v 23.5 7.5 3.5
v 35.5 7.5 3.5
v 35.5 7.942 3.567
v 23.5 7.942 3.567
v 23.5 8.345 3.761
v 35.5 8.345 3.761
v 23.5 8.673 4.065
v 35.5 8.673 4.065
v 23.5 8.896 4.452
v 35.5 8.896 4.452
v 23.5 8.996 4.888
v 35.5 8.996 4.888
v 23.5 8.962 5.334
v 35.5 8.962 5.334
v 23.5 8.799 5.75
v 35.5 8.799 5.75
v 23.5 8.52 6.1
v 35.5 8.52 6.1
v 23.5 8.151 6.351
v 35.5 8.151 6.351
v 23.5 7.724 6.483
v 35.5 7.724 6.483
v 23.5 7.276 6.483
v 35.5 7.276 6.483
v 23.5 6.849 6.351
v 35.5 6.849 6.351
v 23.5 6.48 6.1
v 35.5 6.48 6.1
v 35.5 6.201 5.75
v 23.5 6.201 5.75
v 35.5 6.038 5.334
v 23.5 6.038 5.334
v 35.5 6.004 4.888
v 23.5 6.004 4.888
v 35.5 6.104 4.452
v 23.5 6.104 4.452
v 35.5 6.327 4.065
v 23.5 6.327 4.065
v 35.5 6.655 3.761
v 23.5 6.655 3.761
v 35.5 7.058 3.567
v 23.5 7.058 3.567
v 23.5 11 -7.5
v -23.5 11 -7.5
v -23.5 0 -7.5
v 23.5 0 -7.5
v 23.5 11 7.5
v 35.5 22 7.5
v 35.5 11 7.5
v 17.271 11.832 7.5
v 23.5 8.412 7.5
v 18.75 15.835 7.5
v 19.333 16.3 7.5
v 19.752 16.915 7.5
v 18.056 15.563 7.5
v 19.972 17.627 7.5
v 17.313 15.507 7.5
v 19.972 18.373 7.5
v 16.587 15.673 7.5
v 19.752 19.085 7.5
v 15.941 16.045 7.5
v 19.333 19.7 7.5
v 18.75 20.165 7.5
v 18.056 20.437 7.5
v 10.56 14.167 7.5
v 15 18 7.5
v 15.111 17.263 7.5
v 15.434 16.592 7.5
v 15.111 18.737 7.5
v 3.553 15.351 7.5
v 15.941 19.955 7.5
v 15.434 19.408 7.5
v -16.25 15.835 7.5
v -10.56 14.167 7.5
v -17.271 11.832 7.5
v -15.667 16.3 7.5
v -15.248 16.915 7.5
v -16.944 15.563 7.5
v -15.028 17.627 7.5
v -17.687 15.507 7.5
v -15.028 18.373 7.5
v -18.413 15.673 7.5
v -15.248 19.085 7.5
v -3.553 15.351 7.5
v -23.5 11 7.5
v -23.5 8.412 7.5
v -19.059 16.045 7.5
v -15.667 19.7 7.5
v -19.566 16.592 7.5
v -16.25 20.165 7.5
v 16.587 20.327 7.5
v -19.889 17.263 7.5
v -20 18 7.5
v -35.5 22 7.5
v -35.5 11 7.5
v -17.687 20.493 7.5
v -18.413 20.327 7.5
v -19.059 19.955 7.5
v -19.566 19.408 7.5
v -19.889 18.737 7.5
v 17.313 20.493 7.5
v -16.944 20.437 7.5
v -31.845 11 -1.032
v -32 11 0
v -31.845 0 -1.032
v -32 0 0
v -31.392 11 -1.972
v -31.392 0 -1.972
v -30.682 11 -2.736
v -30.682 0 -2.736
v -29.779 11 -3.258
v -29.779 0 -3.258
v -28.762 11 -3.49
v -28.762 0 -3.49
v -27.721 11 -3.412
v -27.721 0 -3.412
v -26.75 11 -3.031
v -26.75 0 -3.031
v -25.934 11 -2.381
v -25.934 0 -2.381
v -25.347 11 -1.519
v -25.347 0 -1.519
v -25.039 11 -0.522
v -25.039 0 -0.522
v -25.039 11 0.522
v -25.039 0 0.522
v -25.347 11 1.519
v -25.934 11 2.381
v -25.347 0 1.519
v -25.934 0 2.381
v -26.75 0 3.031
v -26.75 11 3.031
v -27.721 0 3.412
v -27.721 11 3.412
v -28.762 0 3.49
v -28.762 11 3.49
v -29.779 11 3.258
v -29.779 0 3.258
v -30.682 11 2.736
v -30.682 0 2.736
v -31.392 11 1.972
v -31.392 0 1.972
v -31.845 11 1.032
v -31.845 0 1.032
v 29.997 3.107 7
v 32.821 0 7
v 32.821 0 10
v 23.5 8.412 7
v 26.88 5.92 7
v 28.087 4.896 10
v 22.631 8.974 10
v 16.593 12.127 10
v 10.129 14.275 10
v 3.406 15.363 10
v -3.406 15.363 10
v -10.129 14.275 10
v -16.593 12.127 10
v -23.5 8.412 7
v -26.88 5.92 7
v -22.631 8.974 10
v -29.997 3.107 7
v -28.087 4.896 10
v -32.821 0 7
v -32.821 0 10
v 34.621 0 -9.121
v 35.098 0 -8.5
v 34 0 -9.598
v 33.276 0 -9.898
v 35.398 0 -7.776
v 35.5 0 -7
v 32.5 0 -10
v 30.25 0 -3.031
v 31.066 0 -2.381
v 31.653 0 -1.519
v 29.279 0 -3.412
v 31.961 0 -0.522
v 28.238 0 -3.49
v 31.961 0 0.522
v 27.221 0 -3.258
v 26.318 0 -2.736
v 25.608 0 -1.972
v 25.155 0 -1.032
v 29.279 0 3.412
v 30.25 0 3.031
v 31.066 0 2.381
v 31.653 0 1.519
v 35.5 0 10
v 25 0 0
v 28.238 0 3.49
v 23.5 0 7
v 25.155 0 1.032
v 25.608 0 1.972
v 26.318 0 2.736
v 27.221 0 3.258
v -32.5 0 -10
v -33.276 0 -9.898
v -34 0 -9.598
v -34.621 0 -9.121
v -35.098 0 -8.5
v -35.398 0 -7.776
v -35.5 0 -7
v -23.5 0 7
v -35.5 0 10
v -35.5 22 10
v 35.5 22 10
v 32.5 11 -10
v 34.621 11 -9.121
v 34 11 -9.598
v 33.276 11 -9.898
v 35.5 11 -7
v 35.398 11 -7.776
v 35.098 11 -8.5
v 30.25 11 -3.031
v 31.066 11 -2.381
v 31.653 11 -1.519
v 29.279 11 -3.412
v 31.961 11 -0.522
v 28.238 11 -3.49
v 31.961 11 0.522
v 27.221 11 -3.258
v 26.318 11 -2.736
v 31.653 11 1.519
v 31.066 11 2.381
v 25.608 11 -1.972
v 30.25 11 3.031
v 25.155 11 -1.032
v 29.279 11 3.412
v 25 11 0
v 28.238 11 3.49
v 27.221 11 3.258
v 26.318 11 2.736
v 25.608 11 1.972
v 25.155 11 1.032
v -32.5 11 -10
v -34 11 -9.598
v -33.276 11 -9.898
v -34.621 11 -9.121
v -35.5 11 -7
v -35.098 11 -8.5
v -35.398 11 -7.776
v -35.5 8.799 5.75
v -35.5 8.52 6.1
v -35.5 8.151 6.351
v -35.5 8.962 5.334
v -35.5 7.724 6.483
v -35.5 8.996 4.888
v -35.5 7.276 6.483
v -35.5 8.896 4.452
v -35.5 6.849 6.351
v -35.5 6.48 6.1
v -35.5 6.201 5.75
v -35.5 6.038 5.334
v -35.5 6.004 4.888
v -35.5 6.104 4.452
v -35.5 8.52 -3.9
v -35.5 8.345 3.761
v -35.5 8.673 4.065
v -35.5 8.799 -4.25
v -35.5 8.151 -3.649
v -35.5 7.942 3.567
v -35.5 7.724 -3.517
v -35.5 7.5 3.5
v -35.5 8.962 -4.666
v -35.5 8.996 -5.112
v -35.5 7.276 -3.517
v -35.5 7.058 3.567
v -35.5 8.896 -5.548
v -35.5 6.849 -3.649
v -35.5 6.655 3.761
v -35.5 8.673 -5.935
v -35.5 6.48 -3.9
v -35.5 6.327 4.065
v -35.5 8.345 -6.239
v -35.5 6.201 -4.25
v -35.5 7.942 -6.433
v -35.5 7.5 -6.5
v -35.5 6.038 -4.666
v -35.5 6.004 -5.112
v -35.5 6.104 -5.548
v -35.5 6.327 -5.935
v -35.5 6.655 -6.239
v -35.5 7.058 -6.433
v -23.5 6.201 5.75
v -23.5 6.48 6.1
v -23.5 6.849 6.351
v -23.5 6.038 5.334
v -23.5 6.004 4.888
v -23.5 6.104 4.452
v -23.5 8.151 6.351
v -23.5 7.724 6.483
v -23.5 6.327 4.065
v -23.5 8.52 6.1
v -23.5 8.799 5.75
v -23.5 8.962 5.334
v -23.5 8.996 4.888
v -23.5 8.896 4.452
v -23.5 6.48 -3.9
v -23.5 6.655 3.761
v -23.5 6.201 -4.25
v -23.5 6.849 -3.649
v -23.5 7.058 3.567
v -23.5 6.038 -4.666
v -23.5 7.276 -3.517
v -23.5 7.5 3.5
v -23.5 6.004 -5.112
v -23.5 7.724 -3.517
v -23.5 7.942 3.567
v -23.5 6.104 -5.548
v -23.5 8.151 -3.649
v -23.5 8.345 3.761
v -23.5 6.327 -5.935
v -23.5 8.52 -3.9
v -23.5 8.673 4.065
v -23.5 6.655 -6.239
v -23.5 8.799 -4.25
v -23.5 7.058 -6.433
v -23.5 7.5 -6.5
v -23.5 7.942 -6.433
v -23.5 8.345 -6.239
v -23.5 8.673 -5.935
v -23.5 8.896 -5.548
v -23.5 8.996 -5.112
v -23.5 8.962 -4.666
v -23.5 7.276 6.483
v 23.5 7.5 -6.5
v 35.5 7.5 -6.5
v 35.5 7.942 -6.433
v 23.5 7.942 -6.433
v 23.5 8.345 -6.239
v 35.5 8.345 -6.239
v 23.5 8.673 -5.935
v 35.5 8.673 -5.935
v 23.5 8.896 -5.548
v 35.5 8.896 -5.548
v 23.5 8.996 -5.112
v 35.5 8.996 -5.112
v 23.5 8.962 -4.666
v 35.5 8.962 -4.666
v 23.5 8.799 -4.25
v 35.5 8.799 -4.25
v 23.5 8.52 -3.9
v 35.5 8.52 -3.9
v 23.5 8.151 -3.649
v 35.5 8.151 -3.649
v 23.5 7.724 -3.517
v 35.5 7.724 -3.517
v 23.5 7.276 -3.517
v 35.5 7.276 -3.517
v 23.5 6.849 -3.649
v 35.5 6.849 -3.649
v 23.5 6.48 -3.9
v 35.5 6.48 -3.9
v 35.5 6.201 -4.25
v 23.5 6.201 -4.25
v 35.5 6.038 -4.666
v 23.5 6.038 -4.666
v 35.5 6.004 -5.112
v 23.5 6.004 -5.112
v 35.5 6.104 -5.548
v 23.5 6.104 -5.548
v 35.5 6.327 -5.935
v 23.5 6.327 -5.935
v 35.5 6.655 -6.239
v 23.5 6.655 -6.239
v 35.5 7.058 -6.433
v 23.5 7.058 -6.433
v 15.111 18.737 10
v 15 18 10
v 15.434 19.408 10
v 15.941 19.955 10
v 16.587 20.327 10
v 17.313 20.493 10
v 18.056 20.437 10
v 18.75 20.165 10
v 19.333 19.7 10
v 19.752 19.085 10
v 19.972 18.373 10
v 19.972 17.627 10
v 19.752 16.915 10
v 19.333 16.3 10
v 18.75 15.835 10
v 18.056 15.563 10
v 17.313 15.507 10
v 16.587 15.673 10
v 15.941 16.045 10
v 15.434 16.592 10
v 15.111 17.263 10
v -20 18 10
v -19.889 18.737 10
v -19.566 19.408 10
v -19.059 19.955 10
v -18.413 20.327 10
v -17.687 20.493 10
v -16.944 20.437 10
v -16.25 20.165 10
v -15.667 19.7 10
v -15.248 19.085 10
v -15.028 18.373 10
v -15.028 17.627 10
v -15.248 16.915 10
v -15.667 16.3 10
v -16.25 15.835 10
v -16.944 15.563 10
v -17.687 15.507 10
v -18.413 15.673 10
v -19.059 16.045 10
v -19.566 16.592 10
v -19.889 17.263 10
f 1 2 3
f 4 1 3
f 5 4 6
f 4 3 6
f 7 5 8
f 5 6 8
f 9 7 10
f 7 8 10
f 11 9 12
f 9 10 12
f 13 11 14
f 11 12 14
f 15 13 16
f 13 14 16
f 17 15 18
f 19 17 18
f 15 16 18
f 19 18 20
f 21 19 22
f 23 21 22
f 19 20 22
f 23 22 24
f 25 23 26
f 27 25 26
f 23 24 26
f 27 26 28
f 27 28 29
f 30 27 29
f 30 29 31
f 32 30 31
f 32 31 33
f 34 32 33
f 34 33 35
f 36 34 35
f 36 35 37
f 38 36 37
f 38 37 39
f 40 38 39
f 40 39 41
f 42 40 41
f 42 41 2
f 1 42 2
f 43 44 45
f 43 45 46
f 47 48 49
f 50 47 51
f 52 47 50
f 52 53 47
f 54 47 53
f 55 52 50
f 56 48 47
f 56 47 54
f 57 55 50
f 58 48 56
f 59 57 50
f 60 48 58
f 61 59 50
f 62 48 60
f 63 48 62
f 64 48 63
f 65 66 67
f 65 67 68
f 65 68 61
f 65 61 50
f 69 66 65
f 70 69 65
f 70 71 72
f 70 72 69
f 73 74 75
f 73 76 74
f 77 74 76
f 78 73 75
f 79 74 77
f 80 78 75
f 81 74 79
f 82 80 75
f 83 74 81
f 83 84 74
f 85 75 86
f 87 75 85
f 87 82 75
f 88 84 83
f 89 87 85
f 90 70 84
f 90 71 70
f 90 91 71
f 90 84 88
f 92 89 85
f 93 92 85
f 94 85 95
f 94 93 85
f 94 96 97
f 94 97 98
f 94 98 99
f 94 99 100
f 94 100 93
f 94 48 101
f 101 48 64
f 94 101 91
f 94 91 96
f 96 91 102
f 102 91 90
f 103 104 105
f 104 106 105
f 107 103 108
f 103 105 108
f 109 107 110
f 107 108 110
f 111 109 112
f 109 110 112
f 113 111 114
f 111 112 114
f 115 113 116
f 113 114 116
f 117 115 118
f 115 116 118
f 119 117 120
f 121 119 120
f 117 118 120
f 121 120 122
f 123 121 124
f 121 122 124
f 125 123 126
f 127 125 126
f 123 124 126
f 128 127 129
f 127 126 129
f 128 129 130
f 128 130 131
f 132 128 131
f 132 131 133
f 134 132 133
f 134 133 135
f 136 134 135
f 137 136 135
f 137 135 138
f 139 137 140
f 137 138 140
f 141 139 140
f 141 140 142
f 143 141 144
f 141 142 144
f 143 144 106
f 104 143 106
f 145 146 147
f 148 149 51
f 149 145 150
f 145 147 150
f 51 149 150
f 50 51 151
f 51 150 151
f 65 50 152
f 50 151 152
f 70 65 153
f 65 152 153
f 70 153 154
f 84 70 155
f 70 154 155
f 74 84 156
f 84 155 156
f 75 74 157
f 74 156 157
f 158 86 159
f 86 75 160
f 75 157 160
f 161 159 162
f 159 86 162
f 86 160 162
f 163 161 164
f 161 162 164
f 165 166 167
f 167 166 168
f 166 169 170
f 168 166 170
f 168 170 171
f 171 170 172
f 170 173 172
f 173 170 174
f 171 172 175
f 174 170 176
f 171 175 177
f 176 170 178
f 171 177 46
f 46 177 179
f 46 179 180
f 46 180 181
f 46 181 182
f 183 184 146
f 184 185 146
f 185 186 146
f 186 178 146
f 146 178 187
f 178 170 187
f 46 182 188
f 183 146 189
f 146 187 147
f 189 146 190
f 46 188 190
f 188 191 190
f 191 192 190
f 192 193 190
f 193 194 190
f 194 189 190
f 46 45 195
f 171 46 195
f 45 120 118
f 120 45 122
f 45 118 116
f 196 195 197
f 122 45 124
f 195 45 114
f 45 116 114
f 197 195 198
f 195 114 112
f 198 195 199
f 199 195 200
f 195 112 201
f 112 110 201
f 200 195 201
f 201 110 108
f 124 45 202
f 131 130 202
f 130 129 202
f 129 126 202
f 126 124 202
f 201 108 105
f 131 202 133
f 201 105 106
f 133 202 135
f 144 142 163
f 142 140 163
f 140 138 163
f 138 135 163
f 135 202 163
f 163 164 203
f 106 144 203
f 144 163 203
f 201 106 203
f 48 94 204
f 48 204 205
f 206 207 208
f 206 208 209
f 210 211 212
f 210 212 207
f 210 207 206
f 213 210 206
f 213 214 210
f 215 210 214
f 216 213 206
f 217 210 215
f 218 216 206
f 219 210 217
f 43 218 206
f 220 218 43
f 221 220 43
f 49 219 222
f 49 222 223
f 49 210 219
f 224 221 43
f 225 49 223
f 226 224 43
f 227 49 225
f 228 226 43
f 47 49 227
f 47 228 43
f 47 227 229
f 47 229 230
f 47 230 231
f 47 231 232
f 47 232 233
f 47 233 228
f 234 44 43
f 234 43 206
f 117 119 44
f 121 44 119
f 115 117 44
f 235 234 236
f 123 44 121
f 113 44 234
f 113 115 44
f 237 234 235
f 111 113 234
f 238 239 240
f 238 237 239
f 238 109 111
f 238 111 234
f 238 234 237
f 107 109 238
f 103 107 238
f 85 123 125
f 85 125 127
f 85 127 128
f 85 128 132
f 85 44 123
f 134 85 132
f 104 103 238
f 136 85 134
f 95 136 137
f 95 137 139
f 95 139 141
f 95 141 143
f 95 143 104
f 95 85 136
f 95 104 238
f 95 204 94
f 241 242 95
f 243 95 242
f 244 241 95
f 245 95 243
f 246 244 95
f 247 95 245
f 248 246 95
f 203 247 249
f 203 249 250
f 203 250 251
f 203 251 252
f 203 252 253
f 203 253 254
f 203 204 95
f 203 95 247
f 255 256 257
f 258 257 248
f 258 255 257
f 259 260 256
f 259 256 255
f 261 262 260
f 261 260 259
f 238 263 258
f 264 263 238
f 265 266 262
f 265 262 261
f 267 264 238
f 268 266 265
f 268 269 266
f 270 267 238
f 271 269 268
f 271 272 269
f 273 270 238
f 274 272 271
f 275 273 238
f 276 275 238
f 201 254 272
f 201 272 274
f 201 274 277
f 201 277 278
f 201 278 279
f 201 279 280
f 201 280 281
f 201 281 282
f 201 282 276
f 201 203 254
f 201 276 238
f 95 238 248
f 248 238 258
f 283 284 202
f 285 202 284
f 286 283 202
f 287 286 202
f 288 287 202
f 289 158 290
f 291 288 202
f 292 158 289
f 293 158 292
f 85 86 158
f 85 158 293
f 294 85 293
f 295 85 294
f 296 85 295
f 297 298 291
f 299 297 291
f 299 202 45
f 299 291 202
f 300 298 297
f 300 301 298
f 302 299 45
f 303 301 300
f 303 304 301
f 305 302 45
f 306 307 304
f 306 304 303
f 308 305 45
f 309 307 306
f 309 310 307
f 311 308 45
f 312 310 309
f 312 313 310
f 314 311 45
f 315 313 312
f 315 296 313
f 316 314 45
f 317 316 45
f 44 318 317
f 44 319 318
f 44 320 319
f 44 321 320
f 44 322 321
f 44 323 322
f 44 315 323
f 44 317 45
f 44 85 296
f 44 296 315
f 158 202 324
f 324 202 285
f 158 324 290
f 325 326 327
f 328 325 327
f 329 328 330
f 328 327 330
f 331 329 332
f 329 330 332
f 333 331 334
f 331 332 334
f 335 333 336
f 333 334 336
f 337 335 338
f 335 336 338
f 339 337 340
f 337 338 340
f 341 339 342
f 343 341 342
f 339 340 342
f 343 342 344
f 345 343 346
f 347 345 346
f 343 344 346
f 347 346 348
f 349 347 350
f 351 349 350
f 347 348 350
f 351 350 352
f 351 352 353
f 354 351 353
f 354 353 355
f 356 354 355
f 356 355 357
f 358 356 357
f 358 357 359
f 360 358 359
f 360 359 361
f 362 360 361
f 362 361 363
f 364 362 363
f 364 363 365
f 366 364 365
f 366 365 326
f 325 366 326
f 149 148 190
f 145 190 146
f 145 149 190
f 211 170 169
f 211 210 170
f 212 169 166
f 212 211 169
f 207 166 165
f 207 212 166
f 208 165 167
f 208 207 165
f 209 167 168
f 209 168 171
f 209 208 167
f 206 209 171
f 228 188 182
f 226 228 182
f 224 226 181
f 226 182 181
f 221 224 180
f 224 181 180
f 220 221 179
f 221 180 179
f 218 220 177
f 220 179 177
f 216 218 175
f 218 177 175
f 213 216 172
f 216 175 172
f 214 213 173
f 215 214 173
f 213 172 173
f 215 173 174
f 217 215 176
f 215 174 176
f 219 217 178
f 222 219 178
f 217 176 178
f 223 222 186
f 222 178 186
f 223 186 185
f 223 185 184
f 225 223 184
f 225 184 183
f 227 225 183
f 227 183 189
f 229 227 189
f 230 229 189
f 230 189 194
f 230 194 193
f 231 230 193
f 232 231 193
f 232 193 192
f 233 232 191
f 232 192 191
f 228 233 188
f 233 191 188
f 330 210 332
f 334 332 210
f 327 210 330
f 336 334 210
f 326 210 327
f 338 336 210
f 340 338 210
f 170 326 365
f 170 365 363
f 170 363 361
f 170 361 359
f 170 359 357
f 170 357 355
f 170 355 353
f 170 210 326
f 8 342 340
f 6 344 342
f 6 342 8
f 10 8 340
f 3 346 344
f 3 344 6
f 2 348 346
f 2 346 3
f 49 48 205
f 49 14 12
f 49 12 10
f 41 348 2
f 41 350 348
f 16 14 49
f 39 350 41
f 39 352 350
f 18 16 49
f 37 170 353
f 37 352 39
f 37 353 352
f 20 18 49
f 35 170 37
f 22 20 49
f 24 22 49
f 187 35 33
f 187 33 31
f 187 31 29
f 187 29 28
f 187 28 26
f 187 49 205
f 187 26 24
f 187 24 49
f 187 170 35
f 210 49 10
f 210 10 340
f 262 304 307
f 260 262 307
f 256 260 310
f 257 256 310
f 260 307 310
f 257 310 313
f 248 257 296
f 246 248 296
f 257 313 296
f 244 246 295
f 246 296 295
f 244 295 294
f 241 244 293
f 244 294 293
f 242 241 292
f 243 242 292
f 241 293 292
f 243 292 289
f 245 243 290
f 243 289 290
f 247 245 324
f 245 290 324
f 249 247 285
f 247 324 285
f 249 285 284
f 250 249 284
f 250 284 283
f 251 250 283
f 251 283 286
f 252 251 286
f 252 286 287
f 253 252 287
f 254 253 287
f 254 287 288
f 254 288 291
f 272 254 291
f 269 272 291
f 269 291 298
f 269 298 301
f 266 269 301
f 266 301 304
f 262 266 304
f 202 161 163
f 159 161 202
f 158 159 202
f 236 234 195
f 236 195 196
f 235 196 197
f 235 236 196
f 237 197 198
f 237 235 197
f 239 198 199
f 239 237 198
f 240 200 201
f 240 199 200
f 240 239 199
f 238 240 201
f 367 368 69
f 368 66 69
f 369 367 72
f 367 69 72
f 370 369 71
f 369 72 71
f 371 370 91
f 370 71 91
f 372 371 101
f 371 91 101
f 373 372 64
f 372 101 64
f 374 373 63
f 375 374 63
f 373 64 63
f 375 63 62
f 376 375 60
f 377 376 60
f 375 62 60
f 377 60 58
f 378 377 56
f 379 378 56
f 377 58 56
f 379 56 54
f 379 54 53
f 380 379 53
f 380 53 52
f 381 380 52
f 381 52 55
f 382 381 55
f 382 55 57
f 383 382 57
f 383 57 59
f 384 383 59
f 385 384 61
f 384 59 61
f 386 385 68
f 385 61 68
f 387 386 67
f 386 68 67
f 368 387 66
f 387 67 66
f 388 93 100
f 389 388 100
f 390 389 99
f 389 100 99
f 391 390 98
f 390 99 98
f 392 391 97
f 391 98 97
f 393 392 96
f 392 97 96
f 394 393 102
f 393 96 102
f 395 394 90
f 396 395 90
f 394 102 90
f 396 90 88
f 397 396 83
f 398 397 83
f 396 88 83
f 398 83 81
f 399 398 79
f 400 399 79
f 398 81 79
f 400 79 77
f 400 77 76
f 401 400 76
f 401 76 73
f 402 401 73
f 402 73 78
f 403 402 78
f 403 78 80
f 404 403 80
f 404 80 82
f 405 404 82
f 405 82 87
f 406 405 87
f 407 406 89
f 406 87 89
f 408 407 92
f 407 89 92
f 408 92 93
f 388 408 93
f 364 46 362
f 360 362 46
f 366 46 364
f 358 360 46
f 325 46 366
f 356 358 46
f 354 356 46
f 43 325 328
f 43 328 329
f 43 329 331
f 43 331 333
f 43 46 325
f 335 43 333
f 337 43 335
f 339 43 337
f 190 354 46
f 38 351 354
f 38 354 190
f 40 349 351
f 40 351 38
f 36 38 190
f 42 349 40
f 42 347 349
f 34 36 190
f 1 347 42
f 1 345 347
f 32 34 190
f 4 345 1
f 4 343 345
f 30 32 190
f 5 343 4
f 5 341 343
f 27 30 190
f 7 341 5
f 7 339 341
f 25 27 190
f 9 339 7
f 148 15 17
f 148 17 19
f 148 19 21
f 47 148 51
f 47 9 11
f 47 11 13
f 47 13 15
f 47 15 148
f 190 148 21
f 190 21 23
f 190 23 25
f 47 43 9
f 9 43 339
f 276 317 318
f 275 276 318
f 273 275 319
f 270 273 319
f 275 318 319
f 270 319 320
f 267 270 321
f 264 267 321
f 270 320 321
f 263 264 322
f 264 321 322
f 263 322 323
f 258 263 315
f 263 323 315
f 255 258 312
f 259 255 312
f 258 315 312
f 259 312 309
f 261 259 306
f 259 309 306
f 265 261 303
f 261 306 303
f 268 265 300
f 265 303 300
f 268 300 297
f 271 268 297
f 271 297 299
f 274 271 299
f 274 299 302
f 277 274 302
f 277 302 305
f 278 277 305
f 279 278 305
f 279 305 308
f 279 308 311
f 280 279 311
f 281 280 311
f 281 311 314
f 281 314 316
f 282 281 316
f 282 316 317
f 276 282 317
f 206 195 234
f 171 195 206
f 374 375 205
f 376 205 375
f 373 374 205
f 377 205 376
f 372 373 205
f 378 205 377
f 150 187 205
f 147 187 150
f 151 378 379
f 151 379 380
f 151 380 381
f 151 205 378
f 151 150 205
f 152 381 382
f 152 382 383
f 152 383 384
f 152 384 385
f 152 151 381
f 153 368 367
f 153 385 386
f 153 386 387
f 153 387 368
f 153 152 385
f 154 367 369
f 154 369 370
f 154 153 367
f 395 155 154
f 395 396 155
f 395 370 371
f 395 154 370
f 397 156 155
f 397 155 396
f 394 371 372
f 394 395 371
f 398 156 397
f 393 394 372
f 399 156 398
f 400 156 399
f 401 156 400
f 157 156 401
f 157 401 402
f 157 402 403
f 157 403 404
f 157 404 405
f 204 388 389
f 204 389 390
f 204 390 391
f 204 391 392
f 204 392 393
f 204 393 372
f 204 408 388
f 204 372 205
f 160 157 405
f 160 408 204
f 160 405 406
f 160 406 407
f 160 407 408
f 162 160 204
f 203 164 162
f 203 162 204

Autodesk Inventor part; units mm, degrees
ref_plane "YZ Plane" through (0, 0, 0) normal (1, 0, 0) x (0, 1, 0)
ref_plane "XZ Plane" through (0, 0, 0) normal (0, 1, 0) x (-1, 0, 0)
ref_plane "XY Plane" through (0, 0, 0) normal (0, 0, 1) x (1, 0, 0)
sketch "Esquisse1" plane through (0, 0, 0) normal (0, 1, 0) x (-1, 0, 0)
  circle A0 centre (-28.5, 0) radius 3.5
  circle A1 centre (28.5, 0) radius 3.5
  line L0 (-35.5, 10) -> (35.5, 10)
  line L1 (35.5, 10) -> (35.5, -10)
  line L2 (35.5, -10) -> (-35.5, -10)
  line L3 (-35.5, -10) -> (-35.5, 10)
  line L4 (-28.5, 0) -> (28.5, 0)
  point P0 (0, 0)
  dimension "d0" = 7
  dimension "d1" = 7
  dimension "d2" = 28.5
  dimension "d3" = 28.5
  dimension "d4" = 20
  dimension "d5" = 10
  dimension "d6" = 7
  dimension "d7" = 7
extrude "Extrusion1" add sketch "Esquisse1" along normal blind 22
sketch "Esquisse2" plane through (0, 22, 0) normal (0, 1, 0) x (1, 0, 0)
  circle A0 centre (-28.5, 0) radius 3.5 projected
  circle A1 centre (28.5, 0) radius 3.5 projected
  line L0 (-23.5, 7.5) -> (23.5, 7.5)
  line L1 (23.5, 7.5) -> (23.5, -7.5)
  line L2 (23.5, -7.5) -> (-23.5, -7.5)
  line L3 (-23.5, -7.5) -> (-23.5, 7.5)
  point P0 (0, 0)
  dimension "d10" = 15
  dimension "d11" = 7.5
  dimension "d12" = 5
  dimension "d13" = 5
extrude "Extrusion2" cut sketch "Esquisse2" against normal through all contours L0 L1 L2 L3
sketch "Esquisse3" plane through (-35.5, 0, 10) normal (0, 0, 1) x (1, 0, 0)
  line L0 (71, 0) -> (0, 0) projected
  line L1 (71, 0) -> (71, 22) projected
  line L2 (0, 22) -> (71, 22) projected
  line L3 (0, 0) -> (0, 22) projected
  line L4 (14, 22) -> (57, 22)
  line L5 (57, 22) -> (57, 0)
  line L6 (57, 0) -> (14, 0)
  line L7 (14, 0) -> (14, 22)
  line L8 (14, 22) -> (22, 22)
  line L9 (22, 22) -> (22, 14)
  line L10 (22, 14) -> (14, 14)
  line L11 (14, 14) -> (14, 22)
  line L12 (57, 22) -> (49, 22)
  line L13 (49, 22) -> (49, 14)
  line L14 (49, 14) -> (57, 14)
  line L15 (57, 14) -> (57, 22)
  line L16 (14, 22) -> (22, 14)
  line L17 (22, 22) -> (14, 14)
  line L18 (49, 14) -> (57, 22)
  line L19 (49, 22) -> (57, 14)
  circle A0 centre (18, 18) radius 2
  circle A1 centre (53, 18) radius 2
  point P0 (35.5, 0)
  dimension "d16" = 14
  dimension "d17" = 14
  dimension "d18" = 8
  dimension "d19" = 8
  dimension "d20" = 8
  dimension "d21" = 8
  dimension "d22" = 4
  dimension "d23" = 4
sketch "Esquisse3 outline for Extrusion3" plane through (-35.5, 0, 10) normal (0, 0, 1) x (1, 0, 0)
  circle A0 centre (18, 18) radius 2
  circle A1 centre (53, 18) radius 2
extrude "Extrusion3" add sketch "Esquisse3 outline for Extrusion3" along normal through all both and the other way through all
sketch "Esquisse4" plane through (35.5, 0, 10) normal (1, 0, 0) x (0, 0, -1)
  line L0 (20, 0) -> (0, 0) projected
  line L1 (0, 22) -> (20, 22) projected
  line L2 (6.5, 22) -> (13.5, 22)
  line L3 (13.5, 22) -> (13.5, 0)
  line L4 (13.5, 0) -> (6.5, 0)
  line L5 (6.5, 0) -> (6.5, 22)
  circle A0 centre (5, 7.5) radius 1.5
  circle A1 centre (15, 7.5) radius 1.5
  line L6 (20, 0) -> (20, 22) projected
  line L7 (0, 0) -> (6.5, 0)
  line L8 (6.5, 0) -> (6.5, 15)
  line L9 (6.5, 15) -> (0, 15)
  line L10 (0, 15) -> (0, 0)
  line L11 (13.5, 0) -> (20, 0)
  line L12 (20, 0) -> (20, 15)
  line L13 (20, 15) -> (13.5, 15)
  line L14 (13.5, 15) -> (13.5, 0)
  line L15 (0, 0) -> (0, 22) projected
  line L16 (13.5, 7.5) -> (20, 7.5)
  line L17 (0, 7.5) -> (6.5, 7.5)
  point P0 (10, 0)
  dimension "d26" = 7
  dimension "d27" = 3.5
  dimension "d28" = 3
  dimension "d29" = 3
  dimension "d32" = 15
extrude "Extrusion4" cut sketch "Esquisse4" against normal through all contours L16 A1 | A1 L16 | L17 A0 | A0 L17
sketch "Esquisse5" plane through (-35.5, 0, 10) normal (0, 0, 1) x (1, 0, 0)
  line L0 (71, 0) -> (0, 0) projected
  line L1 (71, 0) -> (71, 22) projected
  line L2 (0, 22) -> (71, 22) projected
  line L3 (0, 0) -> (0, 22) projected
  line L4 (0, 0) -> (71, 0)
  line L5 (71, 0) -> (71, 11)
  line L6 (71, 11) -> (0, 11)
  line L7 (0, 11) -> (0, 0)
  point P0 (35.5, 0)
  dimension "d33" = 11
  dimension "d34" = 22
extrude "Extrusion5" cut sketch "Esquisse5" against normal through all both and the other way through all contours L6 L3 L2 L1
sketch "Esquisse6" plane through (-35.5, 11, 10) normal (0, 1, 0) x (1, 0, 0)
  line L0 (71, 0) -> (0, 0) projected
  line L1 (59, 2.5) -> (59, 17.5) projected
  line L2 (12, 2.5) -> (59, 2.5)
  line L3 (59, 2.5) -> (59, 0)
  line L4 (59, 0) -> (12, 0)
  line L5 (12, 0) -> (12, 2.5)
  line L6 (0, 0) -> (12, 0)
  line L7 (12, 0) -> (12, 2.5)
  line L8 (12, 2.5) -> (0, 2.5)
  line L9 (0, 2.5) -> (0, 0)
  line L10 (71, 0) -> (59, 0)
  line L11 (59, 0) -> (59, 2.5)
  line L12 (59, 2.5) -> (71, 2.5)
  line L13 (71, 2.5) -> (71, 0)
  point P0 (35.5, 10)
extrude "Extrusion6" add sketch "Esquisse6" along normal blind 11
sketch "Esquisse7" plane through (-35.5, 0, 10) normal (0, 0, 1) x (1, 0, 0)
  line L0 (0, 22) -> (71, 22) projected
  line L1 (35.5, 0) -> (35.5, 22)
  line L2 (35.5, 0) -> (35.5, -27)
  circle A0 centre (35.5, -27) radius 42.5
  point P0 (59, 22)
  point P1 (12, 22)
  dimension "d39" = 27
  dimension "d40" = 85
extrude "Extrusion7" cut sketch "Esquisse7" against normal blind 3
sketch "Esquisse8" plane through (-23.5, 11, 7.5) normal (0, 0, -1) x (-1, 0, 0)
  line L0 (12, 0) -> (-59, 0)
  line L1 (12, 0) -> (12, 11)
  line L2 (-59, 11) -> (12, 11)
  line L3 (-59, 0) -> (-59, 11)
  line L4 (-45, 11) -> (-2, 11)
  line L5 (-2, 11) -> (-2, 0)
  line L6 (-2, 0) -> (-45, 0)
  line L7 (-45, 0) -> (-45, 11)
  line L8 (-45, 11) -> (-37, 11)
  line L9 (-37, 11) -> (-37, 3)
  line L10 (-37, 3) -> (-45, 3)
  line L11 (-45, 3) -> (-45, 11)
  line L12 (-2, 11) -> (-10, 11)
  line L13 (-10, 11) -> (-10, 3)
  line L14 (-10, 3) -> (-2, 3)
  line L15 (-2, 3) -> (-2, 11)
  line L16 (-45, 11) -> (-37, 3)
  line L17 (-37, 11) -> (-45, 3)
  line L18 (-10, 3) -> (-2, 11)
  line L19 (-10, 11) -> (-2, 3)
  circle A0 centre (-41, 7) radius 2.5
  circle A1 centre (-6, 7) radius 2.5
  point P0 (-23.5, -11)
  point P1 (35.5, 0)
  dimension "d43" = 14
  dimension "d44" = 14
  dimension "d45" = 8
  dimension "d46" = 8
  dimension "d47" = 8
  dimension "d48" = 8
  dimension "d49" = 5
  dimension "d50" = 5
extrude "Extrusion8" cut sketch "Esquisse8" against normal through all contours A1 L18 L19 | L19 L18 A1 | L18 L19 A1 | A0 L16 L17 | L17 L16 A0 | A1 L19 L18 | A0 L17 L16 | L16 L17 A0
fillet "Congé1" radius 3 2 edges at (35.5, 5.5, -10) (-35.5, 5.5, -10)
equation "\"d3\" = d2"
equation "\"d5\" = 0.5 * d4"
equation "\"d11\" = 0.5 * d10"
equation "\"d17\" = d16"
equation "\"d27\" = 0.5 * d26"
equation "\"d44\" = d43"
properties part number "tendeur_base_low"
